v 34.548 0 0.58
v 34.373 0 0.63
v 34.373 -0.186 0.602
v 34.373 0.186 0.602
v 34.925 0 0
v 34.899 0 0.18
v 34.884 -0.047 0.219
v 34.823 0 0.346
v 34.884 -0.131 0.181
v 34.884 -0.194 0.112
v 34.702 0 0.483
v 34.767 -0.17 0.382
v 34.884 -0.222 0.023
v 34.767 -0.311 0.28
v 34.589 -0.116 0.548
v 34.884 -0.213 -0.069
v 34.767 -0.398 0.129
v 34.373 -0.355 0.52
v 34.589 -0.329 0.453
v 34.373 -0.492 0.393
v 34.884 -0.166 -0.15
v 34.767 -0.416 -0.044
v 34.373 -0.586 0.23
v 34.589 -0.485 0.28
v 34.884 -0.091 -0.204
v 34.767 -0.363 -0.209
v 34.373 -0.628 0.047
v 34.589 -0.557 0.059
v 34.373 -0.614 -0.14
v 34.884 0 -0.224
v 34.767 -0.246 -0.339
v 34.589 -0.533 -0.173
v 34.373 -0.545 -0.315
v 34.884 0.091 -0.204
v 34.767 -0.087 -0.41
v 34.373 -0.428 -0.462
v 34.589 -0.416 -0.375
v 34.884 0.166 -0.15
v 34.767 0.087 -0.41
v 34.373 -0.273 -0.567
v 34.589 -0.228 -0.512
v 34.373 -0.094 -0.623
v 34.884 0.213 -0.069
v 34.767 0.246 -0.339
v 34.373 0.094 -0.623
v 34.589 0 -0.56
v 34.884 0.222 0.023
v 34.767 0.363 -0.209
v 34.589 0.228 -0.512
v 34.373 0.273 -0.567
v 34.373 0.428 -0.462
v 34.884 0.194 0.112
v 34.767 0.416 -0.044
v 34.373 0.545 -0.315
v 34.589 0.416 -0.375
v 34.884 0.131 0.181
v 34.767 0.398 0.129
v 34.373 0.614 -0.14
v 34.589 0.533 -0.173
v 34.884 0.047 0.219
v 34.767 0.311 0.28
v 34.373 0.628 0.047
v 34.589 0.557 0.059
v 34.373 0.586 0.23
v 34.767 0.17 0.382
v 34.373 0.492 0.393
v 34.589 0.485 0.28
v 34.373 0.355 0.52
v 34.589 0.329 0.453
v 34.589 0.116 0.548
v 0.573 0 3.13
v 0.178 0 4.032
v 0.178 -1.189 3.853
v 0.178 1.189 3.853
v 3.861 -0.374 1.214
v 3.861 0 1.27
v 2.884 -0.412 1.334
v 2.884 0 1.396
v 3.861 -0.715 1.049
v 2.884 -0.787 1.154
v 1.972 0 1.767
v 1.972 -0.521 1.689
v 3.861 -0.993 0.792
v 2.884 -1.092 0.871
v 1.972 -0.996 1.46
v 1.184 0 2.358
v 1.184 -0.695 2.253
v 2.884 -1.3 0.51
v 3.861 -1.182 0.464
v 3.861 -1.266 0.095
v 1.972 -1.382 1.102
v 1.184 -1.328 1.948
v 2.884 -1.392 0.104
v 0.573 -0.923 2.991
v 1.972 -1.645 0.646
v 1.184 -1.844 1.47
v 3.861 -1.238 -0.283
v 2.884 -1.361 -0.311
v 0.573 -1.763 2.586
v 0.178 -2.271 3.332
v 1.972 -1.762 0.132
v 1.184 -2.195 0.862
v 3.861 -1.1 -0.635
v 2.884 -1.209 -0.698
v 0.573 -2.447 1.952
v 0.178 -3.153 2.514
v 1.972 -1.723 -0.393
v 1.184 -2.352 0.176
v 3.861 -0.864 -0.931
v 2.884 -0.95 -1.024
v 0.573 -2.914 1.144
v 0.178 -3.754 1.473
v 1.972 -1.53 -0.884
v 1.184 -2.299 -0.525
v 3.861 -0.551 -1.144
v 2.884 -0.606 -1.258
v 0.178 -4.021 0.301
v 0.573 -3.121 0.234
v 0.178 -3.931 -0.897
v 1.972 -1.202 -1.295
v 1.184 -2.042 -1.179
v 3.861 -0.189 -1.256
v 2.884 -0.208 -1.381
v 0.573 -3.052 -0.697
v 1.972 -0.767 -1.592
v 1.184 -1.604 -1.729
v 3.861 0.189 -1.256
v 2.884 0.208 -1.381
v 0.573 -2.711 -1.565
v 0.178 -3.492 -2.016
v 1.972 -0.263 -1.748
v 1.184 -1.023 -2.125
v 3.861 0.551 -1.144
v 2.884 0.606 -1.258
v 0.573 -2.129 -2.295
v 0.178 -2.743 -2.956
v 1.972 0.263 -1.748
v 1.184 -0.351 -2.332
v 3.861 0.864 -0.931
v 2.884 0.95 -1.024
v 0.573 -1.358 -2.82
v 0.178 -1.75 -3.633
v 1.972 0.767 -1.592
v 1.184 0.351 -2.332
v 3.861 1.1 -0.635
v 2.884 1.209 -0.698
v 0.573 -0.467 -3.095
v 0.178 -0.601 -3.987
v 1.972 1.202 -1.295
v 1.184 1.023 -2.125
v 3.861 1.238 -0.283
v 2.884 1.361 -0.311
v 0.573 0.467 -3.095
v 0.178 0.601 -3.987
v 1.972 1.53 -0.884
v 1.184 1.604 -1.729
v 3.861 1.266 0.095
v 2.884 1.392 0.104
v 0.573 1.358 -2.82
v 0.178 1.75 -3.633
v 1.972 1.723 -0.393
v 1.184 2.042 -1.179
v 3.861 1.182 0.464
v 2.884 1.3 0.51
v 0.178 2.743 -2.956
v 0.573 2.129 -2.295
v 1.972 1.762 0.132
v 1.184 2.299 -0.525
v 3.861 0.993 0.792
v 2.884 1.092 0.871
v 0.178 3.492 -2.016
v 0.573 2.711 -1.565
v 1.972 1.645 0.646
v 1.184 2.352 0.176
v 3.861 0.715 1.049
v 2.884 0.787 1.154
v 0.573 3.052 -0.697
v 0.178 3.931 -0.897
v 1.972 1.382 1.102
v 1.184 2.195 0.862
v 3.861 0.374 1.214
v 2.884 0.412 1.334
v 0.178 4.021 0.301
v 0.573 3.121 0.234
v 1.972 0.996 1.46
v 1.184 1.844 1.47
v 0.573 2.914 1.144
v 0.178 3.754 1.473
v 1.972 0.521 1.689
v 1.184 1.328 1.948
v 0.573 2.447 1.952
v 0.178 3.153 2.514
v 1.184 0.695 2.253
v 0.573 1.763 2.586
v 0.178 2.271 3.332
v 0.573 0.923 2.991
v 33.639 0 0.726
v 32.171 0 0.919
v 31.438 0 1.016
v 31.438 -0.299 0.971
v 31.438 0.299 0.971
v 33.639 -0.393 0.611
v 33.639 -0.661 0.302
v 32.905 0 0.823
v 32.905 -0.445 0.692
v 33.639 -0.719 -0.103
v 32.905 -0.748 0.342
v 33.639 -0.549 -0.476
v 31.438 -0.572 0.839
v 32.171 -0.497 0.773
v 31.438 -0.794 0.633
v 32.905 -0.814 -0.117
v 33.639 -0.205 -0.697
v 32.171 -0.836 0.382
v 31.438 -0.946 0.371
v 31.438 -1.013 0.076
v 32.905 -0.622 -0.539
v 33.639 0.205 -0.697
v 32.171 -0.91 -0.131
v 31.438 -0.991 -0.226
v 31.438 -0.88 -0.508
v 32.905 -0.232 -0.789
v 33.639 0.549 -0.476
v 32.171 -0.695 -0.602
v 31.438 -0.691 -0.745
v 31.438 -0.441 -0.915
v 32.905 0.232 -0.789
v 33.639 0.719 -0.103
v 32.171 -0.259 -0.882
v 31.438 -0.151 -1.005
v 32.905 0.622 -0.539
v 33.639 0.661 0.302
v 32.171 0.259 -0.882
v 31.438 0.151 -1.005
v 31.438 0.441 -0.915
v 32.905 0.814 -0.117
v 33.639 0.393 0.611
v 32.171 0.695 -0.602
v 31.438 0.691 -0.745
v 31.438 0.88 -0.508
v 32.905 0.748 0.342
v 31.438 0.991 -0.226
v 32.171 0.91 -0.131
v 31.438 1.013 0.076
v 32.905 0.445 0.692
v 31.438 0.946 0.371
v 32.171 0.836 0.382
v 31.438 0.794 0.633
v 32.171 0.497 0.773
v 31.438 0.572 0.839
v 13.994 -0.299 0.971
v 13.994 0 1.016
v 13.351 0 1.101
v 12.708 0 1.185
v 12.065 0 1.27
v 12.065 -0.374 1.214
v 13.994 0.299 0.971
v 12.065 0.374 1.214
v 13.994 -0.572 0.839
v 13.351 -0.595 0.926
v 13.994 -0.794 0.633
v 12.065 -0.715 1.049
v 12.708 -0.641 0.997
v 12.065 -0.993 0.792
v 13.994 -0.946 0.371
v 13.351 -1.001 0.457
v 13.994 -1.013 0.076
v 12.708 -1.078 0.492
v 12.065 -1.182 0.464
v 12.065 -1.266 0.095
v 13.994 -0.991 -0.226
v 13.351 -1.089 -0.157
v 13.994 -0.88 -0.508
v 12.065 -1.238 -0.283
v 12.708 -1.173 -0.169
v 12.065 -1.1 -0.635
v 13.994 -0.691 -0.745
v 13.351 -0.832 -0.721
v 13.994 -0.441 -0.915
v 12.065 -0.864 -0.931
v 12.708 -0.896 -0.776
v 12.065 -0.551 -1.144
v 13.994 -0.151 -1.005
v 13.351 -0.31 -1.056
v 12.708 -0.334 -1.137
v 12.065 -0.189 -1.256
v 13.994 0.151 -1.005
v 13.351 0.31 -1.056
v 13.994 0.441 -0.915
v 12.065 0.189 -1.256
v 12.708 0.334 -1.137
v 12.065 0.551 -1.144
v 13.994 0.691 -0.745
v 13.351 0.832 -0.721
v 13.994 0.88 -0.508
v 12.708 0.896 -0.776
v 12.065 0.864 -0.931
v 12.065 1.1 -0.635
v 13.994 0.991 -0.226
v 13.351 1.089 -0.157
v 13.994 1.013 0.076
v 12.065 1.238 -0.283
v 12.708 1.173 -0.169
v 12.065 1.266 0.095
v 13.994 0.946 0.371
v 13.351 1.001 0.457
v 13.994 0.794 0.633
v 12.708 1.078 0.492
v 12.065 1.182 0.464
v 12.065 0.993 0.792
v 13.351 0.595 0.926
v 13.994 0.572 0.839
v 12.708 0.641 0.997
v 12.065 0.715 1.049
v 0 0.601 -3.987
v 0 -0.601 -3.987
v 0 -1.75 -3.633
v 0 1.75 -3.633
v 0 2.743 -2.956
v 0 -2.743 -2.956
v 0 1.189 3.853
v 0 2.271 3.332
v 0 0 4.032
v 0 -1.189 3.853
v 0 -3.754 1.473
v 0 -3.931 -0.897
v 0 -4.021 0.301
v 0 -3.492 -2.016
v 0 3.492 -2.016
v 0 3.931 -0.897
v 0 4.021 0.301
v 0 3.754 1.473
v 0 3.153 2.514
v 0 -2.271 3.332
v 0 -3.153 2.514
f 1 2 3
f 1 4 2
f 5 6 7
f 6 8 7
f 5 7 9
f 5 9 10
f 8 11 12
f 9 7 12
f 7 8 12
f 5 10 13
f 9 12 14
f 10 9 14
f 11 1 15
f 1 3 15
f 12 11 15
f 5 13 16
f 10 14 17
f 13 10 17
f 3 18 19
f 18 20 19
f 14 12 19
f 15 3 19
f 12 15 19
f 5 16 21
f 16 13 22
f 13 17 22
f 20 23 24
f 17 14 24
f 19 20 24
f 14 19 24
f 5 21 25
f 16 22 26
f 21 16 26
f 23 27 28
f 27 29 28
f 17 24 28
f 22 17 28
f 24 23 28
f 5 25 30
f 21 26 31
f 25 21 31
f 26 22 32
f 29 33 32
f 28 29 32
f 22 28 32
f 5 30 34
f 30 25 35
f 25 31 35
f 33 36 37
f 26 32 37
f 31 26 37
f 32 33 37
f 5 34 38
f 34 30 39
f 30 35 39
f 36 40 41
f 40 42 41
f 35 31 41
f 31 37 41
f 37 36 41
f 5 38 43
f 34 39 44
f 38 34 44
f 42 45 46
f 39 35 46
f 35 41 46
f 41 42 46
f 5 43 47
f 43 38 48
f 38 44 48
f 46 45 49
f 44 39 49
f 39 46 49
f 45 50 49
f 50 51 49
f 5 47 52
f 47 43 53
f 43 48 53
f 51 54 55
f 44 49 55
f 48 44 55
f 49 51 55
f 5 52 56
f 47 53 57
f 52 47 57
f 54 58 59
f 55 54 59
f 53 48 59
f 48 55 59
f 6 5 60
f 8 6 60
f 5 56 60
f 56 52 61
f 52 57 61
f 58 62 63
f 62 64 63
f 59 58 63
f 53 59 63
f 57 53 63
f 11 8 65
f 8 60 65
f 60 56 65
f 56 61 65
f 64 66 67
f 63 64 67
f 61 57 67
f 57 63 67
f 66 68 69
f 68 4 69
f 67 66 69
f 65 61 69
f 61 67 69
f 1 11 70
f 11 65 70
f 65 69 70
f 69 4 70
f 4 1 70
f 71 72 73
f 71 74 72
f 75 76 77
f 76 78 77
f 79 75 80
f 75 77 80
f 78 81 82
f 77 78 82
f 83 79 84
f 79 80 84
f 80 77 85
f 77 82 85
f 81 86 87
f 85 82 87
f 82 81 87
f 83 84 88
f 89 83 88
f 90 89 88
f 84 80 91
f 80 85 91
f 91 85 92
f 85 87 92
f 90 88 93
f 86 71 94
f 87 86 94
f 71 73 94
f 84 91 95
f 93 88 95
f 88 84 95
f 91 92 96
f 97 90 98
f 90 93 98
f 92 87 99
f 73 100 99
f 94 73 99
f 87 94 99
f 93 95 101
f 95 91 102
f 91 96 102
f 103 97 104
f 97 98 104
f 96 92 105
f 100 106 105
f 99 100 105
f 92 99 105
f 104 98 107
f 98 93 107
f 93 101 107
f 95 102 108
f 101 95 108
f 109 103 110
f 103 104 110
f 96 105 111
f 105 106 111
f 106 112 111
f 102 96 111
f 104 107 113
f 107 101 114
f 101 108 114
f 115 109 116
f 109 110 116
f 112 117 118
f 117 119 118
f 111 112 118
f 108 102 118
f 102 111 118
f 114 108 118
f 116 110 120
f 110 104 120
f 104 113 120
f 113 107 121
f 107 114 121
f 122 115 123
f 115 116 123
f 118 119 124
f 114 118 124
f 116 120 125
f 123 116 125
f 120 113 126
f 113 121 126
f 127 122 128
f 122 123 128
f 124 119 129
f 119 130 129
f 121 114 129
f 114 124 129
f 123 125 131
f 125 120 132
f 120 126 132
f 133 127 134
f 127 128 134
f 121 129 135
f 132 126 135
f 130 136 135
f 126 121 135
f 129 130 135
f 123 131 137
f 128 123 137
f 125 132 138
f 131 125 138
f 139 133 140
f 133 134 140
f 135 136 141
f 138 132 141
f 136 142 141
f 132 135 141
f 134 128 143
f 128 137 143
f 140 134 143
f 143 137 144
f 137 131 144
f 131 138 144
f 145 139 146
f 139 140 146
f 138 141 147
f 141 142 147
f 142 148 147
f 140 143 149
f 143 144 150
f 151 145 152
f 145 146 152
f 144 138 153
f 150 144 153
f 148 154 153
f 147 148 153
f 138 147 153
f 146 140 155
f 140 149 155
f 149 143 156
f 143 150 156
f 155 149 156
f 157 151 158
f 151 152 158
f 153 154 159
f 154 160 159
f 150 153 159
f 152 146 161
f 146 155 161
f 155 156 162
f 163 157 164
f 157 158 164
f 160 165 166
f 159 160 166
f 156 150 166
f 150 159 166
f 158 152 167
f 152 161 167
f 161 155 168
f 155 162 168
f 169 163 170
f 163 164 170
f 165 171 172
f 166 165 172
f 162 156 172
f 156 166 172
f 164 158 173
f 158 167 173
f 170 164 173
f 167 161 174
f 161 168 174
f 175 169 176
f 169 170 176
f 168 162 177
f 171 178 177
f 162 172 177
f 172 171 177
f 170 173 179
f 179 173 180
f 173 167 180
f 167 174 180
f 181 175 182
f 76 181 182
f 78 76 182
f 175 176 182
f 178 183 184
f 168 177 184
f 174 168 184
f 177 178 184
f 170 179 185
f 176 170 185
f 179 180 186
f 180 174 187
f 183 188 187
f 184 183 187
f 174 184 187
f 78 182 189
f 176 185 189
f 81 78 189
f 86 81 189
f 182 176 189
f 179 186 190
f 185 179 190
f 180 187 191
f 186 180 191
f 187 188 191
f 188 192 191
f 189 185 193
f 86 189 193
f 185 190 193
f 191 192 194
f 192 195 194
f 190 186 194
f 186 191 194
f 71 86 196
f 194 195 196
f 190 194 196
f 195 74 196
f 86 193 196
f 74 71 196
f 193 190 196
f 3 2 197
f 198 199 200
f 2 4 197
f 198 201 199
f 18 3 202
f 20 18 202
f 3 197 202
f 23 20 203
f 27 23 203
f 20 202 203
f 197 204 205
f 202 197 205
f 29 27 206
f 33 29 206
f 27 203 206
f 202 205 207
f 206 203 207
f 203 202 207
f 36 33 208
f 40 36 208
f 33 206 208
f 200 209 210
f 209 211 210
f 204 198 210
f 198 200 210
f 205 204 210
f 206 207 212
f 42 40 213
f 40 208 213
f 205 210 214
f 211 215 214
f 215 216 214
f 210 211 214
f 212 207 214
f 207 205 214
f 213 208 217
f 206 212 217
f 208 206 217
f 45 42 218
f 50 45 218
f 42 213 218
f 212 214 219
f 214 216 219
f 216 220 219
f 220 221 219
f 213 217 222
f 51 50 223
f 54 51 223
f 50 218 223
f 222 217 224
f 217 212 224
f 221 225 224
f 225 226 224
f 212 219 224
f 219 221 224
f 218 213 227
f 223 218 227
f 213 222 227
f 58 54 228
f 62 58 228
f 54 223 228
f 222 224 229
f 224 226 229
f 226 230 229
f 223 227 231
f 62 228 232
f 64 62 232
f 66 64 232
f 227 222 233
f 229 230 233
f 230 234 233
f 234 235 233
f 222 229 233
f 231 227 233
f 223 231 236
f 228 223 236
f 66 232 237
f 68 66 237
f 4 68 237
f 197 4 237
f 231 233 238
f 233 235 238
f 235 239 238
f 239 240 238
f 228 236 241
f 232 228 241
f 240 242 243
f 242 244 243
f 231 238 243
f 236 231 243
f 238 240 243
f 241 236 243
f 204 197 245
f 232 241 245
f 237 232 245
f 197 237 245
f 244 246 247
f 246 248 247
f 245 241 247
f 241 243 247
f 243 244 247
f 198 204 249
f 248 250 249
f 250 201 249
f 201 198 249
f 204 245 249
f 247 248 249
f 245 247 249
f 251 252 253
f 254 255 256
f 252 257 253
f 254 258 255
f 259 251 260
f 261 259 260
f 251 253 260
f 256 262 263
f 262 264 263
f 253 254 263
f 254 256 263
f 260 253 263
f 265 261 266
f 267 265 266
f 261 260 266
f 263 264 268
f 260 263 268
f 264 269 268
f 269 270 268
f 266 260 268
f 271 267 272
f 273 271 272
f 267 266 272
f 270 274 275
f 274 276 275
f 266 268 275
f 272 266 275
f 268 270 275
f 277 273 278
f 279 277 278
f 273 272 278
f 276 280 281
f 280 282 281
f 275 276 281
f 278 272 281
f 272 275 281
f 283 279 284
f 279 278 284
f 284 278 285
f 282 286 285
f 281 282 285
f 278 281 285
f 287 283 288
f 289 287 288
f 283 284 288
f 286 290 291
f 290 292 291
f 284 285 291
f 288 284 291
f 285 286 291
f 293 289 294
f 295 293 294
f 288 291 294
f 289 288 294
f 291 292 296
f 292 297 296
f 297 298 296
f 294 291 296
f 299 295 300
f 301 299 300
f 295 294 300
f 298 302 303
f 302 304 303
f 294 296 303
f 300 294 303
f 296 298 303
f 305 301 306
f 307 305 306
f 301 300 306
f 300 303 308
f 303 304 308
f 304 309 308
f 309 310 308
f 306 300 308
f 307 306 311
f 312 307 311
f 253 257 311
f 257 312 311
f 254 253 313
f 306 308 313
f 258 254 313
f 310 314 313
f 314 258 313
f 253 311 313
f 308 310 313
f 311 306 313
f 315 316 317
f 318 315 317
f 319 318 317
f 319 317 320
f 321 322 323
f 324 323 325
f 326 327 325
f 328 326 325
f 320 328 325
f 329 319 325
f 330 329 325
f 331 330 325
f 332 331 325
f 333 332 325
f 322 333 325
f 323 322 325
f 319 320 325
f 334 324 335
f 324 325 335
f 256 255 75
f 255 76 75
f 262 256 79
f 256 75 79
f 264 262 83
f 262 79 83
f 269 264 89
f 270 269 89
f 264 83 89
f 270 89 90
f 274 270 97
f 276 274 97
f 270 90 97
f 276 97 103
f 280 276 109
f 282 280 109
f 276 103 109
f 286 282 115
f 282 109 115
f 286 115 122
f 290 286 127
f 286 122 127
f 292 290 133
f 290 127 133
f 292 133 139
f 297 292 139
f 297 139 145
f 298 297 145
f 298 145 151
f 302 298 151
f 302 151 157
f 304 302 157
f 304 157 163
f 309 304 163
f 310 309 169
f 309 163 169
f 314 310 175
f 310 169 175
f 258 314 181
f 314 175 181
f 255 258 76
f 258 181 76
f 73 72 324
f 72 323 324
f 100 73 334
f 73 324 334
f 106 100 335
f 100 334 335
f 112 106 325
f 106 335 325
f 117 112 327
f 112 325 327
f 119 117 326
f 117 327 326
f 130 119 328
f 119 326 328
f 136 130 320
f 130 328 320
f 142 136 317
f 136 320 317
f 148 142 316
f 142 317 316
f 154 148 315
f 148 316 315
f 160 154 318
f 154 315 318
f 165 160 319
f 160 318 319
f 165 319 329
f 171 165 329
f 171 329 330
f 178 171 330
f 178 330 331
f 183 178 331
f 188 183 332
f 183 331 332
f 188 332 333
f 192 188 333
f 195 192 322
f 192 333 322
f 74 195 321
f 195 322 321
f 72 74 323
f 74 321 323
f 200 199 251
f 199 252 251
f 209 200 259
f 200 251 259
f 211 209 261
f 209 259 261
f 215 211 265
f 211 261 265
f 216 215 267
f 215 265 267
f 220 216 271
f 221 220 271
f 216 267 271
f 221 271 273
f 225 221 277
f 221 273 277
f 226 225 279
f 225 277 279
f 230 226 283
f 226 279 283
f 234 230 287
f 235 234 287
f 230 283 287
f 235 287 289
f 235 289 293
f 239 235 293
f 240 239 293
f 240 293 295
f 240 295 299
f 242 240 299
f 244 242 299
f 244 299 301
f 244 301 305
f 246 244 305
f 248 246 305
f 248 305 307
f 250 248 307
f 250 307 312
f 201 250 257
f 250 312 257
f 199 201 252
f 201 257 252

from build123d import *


with BuildPart() as part:
    # Sketch1 → Revolve1 (revolve)
    with BuildSketch(Plane.XY, mode=Mode.PRIVATE) as revolve1_sk:
        with BuildLine():
            Line((0, -4.03225), (0, 0))
            Line((0, 0), (34.925, 0))
            ThreePointArc((34.925, 0), (34.767418278, -0.418684593), (34.372884132, -0.629567487))
            Line((34.372884132, -0.629567487), (31.437637782, -1.016))
            Line((31.437637782, -1.016), (13.994321545, -1.016))
            Line((13.994321545, -1.016), (12.065, -1.27))
            Line((12.065, -1.27), (3.8608, -1.27))
            ThreePointArc((3.8608, -1.27), (1.558925, -2.037291667), (0.1778, -4.03225))
            Line((0.1778, -4.03225), (0, -4.03225))
        make_face()
    revolve(revolve1_sk.sketch.rotate(Axis((0, 0, 0), (1, 0, 0)), 270), axis=Axis((0, 0, 0), (1, 0, 0)))


solid = part.part
